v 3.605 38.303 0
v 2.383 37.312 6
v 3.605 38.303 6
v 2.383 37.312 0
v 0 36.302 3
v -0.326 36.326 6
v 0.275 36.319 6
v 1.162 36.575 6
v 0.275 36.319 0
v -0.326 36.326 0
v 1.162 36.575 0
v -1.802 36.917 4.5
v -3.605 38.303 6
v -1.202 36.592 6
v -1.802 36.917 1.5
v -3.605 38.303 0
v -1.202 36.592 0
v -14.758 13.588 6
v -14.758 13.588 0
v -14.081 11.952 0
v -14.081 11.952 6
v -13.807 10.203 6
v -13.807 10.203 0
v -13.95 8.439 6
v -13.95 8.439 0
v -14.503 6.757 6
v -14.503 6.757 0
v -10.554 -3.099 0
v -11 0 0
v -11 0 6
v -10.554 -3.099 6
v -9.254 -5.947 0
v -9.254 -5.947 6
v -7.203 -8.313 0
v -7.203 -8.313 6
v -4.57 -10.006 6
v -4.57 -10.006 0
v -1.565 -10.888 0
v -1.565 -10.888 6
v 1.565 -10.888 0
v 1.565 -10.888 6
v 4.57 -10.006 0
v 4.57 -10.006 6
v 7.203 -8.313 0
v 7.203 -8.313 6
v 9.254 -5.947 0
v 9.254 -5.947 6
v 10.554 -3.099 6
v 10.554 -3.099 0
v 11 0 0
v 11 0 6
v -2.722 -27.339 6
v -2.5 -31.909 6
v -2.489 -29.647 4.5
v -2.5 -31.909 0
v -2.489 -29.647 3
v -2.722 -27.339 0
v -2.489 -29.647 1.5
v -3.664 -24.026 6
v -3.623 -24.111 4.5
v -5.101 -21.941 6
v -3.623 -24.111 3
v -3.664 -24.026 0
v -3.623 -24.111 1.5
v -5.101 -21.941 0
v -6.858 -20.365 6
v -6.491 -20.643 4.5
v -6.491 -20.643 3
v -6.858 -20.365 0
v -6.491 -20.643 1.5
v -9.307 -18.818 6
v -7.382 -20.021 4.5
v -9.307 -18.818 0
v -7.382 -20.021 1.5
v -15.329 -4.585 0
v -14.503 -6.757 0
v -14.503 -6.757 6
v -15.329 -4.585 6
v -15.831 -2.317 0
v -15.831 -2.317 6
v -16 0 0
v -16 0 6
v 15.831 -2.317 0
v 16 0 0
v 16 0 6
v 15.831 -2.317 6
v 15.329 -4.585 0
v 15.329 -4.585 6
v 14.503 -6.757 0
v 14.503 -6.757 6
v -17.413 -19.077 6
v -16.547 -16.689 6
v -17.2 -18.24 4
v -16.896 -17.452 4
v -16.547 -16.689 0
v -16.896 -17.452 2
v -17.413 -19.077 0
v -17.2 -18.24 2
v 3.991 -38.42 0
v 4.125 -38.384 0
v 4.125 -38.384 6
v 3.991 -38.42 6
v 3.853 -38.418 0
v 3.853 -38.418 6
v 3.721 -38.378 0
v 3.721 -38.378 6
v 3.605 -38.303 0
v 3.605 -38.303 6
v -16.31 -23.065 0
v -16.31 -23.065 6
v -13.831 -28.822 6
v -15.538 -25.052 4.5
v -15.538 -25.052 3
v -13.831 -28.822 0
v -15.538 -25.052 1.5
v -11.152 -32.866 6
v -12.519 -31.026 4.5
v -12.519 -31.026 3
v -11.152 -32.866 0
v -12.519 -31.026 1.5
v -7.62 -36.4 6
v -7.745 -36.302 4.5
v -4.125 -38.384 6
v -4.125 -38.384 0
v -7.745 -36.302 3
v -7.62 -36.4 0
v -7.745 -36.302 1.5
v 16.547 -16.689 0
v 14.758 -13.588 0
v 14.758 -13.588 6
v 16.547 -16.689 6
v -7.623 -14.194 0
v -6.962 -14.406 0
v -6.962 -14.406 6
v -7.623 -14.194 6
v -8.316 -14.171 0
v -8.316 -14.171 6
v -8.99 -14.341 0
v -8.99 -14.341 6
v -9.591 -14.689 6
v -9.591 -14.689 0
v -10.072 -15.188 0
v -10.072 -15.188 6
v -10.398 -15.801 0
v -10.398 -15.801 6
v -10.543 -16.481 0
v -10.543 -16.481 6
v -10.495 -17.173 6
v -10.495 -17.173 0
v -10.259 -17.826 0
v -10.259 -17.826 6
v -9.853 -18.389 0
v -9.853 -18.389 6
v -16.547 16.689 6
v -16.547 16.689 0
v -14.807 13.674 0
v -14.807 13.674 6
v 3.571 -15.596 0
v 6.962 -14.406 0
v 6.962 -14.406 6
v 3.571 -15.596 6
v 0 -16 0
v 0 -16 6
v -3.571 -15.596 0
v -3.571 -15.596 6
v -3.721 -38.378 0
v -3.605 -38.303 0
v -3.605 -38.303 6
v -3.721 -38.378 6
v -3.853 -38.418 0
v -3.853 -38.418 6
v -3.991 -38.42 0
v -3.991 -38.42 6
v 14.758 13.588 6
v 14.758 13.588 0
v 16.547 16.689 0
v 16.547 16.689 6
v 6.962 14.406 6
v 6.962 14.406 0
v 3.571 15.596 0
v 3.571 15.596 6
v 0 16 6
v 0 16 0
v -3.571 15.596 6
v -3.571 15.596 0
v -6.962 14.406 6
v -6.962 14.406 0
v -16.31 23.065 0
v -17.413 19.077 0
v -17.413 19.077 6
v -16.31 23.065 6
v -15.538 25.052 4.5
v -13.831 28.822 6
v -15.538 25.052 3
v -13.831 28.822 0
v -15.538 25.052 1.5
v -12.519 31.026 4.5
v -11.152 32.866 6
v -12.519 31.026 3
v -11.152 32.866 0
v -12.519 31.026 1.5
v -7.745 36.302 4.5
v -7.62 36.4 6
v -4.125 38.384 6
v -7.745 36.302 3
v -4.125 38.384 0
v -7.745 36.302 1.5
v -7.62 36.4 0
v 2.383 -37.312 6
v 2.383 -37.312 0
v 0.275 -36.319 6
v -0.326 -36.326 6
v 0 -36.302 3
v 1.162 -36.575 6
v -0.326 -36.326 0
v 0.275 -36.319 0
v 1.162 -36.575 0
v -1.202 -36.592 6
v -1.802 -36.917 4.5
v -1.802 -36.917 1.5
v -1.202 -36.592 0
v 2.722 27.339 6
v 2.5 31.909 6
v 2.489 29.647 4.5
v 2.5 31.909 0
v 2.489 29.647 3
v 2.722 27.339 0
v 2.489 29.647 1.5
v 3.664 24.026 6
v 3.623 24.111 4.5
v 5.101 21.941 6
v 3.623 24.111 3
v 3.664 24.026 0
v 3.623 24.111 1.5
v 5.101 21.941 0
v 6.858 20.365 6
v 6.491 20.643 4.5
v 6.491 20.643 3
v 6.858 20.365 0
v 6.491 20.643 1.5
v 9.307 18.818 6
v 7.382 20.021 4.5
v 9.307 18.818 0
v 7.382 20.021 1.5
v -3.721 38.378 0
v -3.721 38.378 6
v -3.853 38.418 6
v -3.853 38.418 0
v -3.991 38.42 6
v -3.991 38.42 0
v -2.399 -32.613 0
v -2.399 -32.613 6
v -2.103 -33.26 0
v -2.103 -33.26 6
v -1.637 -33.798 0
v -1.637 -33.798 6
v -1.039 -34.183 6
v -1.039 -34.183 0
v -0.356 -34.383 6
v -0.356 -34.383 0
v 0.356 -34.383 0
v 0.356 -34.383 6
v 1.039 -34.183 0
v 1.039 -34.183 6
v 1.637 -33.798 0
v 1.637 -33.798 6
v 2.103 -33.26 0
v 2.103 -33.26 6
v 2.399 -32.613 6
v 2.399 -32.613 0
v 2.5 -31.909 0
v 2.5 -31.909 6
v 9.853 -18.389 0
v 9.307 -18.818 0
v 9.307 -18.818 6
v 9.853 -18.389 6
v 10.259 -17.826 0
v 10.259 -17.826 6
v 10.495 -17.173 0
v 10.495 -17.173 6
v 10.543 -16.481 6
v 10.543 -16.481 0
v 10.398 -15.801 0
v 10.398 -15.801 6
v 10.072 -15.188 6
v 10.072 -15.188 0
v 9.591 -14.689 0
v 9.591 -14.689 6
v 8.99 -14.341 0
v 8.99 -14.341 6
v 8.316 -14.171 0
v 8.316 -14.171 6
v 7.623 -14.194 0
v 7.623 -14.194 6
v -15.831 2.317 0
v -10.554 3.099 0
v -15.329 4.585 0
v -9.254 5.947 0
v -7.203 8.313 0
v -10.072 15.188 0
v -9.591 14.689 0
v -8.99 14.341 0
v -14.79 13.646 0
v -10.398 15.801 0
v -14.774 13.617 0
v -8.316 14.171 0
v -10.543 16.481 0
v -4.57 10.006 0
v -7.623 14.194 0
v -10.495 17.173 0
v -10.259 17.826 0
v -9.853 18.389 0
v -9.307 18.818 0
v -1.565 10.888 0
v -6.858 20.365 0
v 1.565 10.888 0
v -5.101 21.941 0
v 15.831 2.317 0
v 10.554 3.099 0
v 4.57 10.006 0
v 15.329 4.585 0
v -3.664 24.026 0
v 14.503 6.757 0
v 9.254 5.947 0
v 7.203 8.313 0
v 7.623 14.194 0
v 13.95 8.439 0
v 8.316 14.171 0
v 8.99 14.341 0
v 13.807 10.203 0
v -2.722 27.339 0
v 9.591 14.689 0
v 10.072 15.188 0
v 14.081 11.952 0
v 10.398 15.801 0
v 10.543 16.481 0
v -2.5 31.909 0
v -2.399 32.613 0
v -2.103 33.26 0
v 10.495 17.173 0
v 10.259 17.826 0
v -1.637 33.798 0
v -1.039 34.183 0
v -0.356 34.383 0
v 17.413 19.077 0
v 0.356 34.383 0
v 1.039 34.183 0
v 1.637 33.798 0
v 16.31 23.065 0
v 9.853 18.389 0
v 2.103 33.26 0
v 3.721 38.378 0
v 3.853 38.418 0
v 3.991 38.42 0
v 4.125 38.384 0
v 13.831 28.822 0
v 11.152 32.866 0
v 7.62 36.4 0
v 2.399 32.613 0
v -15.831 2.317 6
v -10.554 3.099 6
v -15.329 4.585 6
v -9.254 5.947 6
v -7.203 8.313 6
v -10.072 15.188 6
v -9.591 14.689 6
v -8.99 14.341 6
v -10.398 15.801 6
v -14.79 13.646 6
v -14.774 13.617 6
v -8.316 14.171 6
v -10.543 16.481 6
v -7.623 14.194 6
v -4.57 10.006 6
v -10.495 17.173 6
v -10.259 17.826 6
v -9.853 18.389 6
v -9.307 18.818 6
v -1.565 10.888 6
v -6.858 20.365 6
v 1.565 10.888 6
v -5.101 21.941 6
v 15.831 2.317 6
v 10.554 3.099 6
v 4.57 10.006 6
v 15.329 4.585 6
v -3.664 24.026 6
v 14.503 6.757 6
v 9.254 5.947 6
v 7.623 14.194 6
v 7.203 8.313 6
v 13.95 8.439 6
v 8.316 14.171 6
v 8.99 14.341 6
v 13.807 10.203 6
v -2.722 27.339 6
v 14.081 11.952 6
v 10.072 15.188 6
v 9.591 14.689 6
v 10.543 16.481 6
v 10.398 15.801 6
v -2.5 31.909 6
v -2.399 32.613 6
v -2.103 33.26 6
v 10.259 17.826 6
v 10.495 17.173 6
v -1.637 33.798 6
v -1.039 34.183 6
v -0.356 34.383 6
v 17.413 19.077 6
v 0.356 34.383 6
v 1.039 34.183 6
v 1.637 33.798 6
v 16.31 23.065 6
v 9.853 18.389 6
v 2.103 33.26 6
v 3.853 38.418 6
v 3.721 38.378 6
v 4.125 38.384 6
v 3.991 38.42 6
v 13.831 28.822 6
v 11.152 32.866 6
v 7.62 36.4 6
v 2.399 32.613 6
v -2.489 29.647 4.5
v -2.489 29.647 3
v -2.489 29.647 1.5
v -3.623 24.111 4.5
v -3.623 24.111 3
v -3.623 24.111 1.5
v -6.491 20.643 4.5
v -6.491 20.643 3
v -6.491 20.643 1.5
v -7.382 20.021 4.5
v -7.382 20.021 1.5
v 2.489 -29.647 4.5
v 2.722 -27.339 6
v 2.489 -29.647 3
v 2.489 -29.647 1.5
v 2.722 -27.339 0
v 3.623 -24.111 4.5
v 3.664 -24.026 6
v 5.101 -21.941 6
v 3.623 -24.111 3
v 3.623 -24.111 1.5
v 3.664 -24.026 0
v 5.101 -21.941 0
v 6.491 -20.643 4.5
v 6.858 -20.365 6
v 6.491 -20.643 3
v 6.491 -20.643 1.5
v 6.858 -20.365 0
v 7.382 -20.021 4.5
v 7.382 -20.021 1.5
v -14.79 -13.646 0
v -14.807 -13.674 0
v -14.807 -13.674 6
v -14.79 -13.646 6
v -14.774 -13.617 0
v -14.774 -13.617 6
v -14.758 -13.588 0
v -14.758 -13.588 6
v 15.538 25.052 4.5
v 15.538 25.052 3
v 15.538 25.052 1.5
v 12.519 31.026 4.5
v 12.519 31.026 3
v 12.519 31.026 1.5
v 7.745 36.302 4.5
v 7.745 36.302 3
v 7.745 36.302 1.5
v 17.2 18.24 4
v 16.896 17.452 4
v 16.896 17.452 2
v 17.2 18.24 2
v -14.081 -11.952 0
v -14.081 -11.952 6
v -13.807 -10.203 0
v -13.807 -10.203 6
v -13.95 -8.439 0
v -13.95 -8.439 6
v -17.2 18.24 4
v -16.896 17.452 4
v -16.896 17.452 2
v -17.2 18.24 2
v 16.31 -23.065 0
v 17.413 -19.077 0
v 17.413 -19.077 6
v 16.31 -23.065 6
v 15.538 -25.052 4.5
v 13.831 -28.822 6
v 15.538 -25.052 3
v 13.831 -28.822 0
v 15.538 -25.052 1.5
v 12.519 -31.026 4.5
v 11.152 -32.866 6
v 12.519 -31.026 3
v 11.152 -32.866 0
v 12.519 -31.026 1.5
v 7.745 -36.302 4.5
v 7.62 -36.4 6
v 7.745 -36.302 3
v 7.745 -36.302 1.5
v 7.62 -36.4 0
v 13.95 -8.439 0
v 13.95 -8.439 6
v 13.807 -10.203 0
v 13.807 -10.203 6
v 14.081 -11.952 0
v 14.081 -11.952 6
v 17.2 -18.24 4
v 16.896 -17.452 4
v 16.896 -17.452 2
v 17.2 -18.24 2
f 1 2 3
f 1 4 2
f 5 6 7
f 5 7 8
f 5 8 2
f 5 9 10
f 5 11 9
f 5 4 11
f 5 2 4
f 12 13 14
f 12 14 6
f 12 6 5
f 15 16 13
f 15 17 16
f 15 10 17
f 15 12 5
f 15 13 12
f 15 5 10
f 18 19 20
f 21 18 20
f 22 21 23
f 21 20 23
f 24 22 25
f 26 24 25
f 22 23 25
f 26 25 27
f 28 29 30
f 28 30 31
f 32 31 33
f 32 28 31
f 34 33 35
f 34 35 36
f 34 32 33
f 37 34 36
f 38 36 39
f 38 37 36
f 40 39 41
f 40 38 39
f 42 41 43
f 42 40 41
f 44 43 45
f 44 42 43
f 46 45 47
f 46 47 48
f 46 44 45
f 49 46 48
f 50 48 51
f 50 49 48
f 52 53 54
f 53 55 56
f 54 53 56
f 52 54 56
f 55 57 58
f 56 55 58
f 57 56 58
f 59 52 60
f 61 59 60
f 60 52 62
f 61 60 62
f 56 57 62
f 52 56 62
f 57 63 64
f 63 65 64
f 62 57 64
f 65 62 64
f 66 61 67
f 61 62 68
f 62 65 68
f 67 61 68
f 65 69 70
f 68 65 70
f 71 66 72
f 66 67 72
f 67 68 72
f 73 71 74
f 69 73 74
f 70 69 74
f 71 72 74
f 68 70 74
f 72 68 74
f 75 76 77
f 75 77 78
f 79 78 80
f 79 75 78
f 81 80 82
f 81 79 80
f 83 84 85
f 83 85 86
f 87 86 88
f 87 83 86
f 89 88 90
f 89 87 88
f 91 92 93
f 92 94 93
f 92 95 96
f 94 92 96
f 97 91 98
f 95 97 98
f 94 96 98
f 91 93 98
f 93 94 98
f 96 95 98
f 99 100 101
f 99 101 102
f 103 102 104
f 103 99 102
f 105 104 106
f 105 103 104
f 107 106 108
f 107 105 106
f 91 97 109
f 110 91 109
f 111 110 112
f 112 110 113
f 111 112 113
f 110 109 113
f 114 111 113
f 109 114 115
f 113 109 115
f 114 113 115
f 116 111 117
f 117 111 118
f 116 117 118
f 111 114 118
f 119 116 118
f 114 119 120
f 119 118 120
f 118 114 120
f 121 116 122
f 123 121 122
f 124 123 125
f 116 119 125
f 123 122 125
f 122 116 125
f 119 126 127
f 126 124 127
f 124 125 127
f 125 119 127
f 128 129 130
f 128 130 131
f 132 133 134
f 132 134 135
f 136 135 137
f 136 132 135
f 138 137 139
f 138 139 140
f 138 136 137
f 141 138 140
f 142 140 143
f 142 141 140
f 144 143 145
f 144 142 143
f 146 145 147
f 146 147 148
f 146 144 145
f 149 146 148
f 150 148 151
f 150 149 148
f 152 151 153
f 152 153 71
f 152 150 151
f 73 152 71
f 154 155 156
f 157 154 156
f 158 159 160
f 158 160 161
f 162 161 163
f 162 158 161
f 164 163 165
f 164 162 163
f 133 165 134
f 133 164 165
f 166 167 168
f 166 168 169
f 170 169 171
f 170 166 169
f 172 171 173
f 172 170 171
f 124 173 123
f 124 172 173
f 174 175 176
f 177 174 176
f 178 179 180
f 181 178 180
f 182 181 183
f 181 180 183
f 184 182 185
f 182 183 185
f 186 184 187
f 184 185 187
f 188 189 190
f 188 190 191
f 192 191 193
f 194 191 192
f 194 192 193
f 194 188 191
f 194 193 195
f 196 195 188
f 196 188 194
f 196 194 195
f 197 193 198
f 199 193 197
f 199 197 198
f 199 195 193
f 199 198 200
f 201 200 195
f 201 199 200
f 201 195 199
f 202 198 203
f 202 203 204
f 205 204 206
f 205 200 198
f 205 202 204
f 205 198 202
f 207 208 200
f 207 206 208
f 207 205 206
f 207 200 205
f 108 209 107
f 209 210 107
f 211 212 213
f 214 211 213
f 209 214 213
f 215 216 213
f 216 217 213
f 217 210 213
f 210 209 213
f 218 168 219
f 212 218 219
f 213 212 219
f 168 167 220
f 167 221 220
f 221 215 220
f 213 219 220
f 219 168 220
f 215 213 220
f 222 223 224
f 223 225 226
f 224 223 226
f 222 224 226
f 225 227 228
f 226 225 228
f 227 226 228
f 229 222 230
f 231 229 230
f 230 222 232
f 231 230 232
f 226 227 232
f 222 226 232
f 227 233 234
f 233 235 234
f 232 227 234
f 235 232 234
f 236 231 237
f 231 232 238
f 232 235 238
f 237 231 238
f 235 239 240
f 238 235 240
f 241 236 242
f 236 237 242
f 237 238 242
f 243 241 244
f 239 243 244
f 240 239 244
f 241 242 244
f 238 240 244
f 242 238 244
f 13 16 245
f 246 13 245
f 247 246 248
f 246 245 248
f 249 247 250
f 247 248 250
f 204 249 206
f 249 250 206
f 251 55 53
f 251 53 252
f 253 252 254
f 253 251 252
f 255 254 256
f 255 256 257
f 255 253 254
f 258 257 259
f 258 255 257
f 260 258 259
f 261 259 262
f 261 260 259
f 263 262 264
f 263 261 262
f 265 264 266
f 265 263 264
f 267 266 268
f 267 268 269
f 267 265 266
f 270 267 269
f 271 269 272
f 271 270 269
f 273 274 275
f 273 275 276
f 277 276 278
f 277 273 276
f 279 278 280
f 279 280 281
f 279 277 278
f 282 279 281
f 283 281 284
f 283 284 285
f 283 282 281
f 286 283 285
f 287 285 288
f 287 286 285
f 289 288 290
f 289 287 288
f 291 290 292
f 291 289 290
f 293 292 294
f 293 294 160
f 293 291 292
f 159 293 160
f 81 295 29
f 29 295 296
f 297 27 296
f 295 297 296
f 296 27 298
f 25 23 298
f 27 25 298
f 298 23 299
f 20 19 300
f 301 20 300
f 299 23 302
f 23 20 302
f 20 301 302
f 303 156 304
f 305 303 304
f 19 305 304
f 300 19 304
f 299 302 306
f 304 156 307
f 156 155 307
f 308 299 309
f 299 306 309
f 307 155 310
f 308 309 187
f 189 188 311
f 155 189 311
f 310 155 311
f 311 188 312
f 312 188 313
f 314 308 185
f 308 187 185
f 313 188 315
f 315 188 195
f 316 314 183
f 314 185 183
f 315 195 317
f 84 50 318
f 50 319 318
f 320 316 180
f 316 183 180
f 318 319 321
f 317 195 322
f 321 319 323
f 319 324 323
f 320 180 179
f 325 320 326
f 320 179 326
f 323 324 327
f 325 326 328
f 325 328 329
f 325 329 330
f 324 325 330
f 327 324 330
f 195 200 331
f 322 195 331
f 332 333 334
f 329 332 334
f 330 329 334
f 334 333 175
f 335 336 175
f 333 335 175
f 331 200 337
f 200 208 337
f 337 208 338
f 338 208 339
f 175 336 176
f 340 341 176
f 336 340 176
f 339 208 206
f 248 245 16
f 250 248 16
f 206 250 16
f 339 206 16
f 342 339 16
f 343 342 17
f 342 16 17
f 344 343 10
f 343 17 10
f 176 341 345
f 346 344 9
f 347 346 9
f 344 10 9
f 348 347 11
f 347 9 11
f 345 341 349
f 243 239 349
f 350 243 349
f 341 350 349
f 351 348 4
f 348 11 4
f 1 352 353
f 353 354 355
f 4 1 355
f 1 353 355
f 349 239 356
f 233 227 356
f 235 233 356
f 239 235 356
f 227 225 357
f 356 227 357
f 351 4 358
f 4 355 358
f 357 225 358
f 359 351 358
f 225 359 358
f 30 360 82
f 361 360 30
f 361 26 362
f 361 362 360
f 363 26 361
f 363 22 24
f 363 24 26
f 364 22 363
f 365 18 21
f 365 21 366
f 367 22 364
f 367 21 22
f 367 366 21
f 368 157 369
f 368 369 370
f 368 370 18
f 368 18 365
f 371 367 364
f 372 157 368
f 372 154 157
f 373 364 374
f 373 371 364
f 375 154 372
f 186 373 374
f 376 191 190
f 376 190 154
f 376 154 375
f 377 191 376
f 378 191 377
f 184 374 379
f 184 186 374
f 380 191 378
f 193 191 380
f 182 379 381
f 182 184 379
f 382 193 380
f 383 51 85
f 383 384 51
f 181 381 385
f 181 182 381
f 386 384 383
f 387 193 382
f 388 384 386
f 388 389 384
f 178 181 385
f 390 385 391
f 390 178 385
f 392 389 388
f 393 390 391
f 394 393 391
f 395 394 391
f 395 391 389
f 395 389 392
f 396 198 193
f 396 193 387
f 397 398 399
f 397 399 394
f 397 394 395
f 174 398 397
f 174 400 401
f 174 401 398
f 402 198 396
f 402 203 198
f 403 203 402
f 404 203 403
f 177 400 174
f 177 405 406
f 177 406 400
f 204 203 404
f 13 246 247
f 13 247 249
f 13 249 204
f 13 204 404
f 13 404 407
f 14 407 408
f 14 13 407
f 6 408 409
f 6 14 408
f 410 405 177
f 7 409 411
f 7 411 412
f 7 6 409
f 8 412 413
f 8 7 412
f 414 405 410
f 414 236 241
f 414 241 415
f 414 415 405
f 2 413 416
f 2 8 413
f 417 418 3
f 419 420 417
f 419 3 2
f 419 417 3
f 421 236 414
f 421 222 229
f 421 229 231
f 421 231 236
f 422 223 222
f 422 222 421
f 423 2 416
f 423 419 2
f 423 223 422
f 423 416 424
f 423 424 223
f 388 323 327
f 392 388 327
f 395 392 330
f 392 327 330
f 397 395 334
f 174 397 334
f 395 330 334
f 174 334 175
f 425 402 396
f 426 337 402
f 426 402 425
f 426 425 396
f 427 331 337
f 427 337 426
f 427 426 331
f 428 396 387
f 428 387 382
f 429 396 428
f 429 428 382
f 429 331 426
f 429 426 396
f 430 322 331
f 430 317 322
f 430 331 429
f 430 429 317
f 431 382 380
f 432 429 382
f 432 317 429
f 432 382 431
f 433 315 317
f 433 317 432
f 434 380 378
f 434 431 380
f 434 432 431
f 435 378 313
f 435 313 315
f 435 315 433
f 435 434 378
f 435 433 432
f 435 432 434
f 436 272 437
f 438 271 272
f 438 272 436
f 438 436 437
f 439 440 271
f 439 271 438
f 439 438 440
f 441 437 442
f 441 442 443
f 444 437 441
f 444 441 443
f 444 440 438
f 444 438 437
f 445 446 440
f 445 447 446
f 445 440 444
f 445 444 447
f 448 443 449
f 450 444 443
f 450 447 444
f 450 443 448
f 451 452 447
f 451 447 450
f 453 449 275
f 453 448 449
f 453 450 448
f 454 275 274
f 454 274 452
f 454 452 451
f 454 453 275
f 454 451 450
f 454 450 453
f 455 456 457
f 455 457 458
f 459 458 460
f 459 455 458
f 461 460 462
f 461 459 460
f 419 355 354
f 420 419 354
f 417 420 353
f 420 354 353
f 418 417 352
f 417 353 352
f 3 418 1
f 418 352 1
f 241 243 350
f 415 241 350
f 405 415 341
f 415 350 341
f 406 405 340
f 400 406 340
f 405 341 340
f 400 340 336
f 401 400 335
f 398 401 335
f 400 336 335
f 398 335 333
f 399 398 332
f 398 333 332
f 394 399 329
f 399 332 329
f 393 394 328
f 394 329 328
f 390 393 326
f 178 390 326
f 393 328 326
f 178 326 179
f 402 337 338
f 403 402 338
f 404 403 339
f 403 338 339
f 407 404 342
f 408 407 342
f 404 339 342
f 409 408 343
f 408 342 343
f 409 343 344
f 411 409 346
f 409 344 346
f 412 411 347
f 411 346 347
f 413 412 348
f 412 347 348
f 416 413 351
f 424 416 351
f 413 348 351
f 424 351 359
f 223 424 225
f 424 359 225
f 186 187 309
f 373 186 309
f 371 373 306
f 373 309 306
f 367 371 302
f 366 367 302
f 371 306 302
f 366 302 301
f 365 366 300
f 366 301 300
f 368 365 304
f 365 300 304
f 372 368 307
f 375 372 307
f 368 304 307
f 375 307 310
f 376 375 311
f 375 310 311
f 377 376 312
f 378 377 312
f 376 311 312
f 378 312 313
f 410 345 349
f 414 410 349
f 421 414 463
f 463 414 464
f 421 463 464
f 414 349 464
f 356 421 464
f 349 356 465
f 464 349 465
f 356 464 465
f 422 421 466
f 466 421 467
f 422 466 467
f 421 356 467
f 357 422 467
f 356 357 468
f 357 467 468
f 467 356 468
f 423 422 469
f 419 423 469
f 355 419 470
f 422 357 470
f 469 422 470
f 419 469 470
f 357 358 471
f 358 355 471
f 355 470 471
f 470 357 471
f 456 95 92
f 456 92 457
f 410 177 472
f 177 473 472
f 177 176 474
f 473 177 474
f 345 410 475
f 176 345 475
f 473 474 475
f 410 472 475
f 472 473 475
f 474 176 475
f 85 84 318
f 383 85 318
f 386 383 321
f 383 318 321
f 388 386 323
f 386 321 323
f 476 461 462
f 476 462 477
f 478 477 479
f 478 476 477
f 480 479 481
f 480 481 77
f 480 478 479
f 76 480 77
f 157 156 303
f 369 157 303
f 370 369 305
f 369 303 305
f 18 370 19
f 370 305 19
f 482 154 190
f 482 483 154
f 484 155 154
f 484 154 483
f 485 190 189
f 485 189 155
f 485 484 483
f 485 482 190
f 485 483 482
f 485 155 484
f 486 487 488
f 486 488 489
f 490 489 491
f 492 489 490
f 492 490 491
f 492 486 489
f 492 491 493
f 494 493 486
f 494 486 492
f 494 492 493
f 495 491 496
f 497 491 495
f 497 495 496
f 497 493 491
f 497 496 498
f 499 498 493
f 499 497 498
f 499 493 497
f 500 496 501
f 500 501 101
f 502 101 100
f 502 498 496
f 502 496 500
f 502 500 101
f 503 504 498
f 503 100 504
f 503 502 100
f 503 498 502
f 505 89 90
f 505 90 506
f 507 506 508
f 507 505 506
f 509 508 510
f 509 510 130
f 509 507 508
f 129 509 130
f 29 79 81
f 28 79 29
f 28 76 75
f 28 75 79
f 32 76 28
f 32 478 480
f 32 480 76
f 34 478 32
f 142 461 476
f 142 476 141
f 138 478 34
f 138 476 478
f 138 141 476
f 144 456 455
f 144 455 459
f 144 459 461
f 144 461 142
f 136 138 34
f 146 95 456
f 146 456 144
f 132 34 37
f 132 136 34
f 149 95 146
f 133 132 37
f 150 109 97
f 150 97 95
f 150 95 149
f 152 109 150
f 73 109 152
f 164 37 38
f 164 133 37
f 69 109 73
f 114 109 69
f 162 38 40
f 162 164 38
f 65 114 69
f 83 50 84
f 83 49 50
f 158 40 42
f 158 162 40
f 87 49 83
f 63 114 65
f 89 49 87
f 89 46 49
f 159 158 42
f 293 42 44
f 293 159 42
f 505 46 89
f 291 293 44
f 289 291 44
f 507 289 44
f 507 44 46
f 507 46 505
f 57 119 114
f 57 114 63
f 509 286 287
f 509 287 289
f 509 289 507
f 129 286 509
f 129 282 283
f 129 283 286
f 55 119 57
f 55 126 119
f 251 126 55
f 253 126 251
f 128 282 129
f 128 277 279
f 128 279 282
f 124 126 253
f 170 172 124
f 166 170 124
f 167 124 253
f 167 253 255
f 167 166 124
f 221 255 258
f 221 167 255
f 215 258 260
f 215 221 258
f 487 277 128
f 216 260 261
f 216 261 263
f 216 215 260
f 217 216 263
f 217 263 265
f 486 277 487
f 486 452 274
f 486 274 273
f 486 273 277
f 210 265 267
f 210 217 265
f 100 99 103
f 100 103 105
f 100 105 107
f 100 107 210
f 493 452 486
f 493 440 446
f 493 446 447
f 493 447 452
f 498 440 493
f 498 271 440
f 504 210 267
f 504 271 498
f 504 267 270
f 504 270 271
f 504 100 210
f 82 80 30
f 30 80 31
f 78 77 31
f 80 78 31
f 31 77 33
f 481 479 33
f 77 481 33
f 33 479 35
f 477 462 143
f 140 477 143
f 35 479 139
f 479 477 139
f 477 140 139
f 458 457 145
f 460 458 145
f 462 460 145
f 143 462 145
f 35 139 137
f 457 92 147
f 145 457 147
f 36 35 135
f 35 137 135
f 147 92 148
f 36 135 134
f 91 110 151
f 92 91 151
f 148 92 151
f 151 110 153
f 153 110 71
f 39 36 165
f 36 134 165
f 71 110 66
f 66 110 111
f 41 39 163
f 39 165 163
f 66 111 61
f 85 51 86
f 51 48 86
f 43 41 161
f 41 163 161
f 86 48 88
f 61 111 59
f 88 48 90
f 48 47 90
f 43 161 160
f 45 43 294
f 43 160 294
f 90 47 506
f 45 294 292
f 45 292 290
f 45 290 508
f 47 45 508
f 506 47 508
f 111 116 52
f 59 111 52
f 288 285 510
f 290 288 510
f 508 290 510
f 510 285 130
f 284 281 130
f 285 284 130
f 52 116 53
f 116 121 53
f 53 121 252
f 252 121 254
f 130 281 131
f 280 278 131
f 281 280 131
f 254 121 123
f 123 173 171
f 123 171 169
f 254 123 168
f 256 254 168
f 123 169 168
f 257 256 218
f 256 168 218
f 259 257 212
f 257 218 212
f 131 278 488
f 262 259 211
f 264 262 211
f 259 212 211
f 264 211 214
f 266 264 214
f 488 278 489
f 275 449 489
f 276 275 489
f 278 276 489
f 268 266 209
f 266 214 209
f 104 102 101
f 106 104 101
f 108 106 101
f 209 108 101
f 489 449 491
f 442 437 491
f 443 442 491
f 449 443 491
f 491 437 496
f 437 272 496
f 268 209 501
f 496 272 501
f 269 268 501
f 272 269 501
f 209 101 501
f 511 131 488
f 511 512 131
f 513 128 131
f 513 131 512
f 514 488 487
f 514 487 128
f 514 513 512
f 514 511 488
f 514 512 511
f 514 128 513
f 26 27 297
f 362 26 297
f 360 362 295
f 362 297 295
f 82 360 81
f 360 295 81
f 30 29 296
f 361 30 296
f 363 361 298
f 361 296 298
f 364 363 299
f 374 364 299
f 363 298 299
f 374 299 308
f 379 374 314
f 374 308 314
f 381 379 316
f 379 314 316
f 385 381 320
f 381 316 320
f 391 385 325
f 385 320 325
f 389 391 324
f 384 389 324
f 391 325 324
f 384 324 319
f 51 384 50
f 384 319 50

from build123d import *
from build123d import SkipClean  # not in build123d's __all__

# Parameters (mm, degrees)
F1_DEPTH = 6


with BuildPart() as f1:
    # F0 (on Top) → F1 (new body)
    with BuildSketch(Plane.XY):
        with BuildLine():
            Line((11, 0), (16, 1.6e-09))
            ThreePointArc((16, 1.6e-09), (15.6213478003, 3.4602735298), (14.5033133881, 6.7567670352))
            ThreePointArc((14.5033133881, 6.7567670352), (13.8069409235, 10.2032214588), (14.7578233989, 13.5883071625))
            Line((14.7578233989, 13.5883071625), (16.5472631726, 16.6890034893))
            add(Edge.make_bspline(
                [(16.5472631726, 16.6890034893), (16.9038641607, 17.448339213), (17.2604651496, 18.2076749358), (17.4132885774, 19.0774979941)],
                knots=[0, 0, 0, 0, 0.470604118, 0.470604118, 0.470604118, 0.470604118], degree=3))
            add(Edge.make_bspline(
                [(17.4132885774, 19.0774979941), (17.1601349358, 20.8732534921), (15.5298067403, 25.2595570374), (12.9266999076, 31.0960374776), (8.0354918433, 36.4833822131), (5.4328634191, 37.8317600488), (4.1245531765, 38.3842009986)],
                knots=[0.1468390725, 0.1468390725, 0.1468390725, 0.1468390725, 0.3630340887, 0.5865738983, 0.817044302, 0.9876810607, 0.9876810607, 0.9876810607, 0.9876810607], degree=3))
            ThreePointArc((4.1245531765, 38.3842009986), (3.8530941398, 38.4176233235), (3.6046637333, 38.3032144361))
            add(Edge.make_bspline(
                [(-3.6046637371, 38.3032144358), (-2.4031091586, 37.2733390488), (-1.8e-09, 35.3316097761), (2.4031091549, 37.2733390491), (3.6046637333, 38.3032144361)],
                knots=[0.030390823, 0.030390823, 0.030390823, 0.030390823, 0.5, 0.969609177, 0.969609177, 0.969609177, 0.969609177], degree=3))
            ThreePointArc((-3.6046637371, 38.3032144358), (-3.8530941436, 38.4176233231), (-4.1245531803, 38.3842009982))
            add(Edge.make_bspline(
                [(-17.4132885793, 19.0774979924), (-17.1601349379, 20.8732534904), (-15.5298067428, 25.2595570358), (-12.9266999107, 31.0960374763), (-8.035491847, 36.4833822123), (-5.4328634228, 37.8317600483), (-4.1245531803, 38.3842009982)],
                knots=[0.1468390725, 0.1468390725, 0.1468390725, 0.1468390725, 0.3630340887, 0.5865738983, 0.817044302, 0.9876810607, 0.9876810607, 0.9876810607, 0.9876810607], degree=3))
            add(Edge.make_bspline(
                [(-16.5472631742, 16.6890034877), (-16.9038641624, 17.4483392113), (-17.2604651514, 18.2076749341), (-17.4132885793, 19.0774979924)],
                knots=[0, 0, 0, 0, 0.470604118, 0.470604118, 0.470604118, 0.470604118], degree=3))
            Line((-16.5472631742, 16.6890034877), (-14.8065510117, 13.6740015815))
            ThreePointArc((-14.8065510117, 13.6740015815), (-14.7820464093, 13.6312344311), (-14.7578234003, 13.588307161))
            ThreePointArc((-14.7578234003, 13.588307161), (-13.8069409246, 10.2032214574), (-14.5033133887, 6.7567670338))
            ThreePointArc((-14.5033133887, 6.7567670338), (-15.6213478009, 3.4602735275), (-16, -1.6e-09))
            Line((-16, -1.6e-09), (-11, 0))
            ThreePointArc((-11, 0), (0, 11), (11, 0))
        make_face()
        with BuildLine():
            ThreePointArc((-2.5000000016, 31.9088473916), (-1.7e-09, 34.4088473916), (2.4999999984, 31.9088473919))
            add(Edge.make_bspline(
                [(2.4999999984, 31.9088473919), (2.4331220875, 30.6490394366), (2.4535157786, 30.0127263528), (2.8986373447, 23.7894092906), (6.9226723249, 20.184951896), (7.2970524431, 20.0978087895), (9.3067939385, 18.8178154741)],
                knots=[0, 0, 0, 0, 0.1919590959, 0.4953854958, 0.7661719362, 1, 1, 1, 1], degree=3))
            ThreePointArc((9.3067939385, 18.8178154741), (10.256799547, 15.4836064731), (6.9615764648, 14.4061255418))
            ThreePointArc((6.9615764648, 14.4061255418), (-8e-10, 16), (-6.9615764662, 14.4061255411))
            ThreePointArc((-6.9615764662, 14.4061255411), (-10.2567995485, 15.483606472), (-9.3067939404, 18.8178154732))
            add(Edge.make_bspline(
                [(-2.5000000016, 31.9088473916), (-2.4331220905, 30.6490394363), (-2.4535157816, 30.0127263526), (-2.898637347, 23.7894092903), (-6.9226723269, 20.1849518953), (-7.2970524451, 20.0978087888), (-9.3067939404, 18.8178154732)],
                knots=[0, 0, 0, 0, 0.1919590959, 0.4953854958, 0.7661719362, 1, 1, 1, 1], degree=3))
        make_face(mode=Mode.SUBTRACT)
    extrude(amount=F1_DEPTH)

    # F2: F1 across plane


with BuildPart() as f1_1:
    add(f1.part, clean=False)
    with SkipClean():  # cleaning this boolean's faces spoils the solid; the shape is the same uncleaned
        add(f1.part.mirror(Plane.XZ), clean=False)


solid = f1_1.part
